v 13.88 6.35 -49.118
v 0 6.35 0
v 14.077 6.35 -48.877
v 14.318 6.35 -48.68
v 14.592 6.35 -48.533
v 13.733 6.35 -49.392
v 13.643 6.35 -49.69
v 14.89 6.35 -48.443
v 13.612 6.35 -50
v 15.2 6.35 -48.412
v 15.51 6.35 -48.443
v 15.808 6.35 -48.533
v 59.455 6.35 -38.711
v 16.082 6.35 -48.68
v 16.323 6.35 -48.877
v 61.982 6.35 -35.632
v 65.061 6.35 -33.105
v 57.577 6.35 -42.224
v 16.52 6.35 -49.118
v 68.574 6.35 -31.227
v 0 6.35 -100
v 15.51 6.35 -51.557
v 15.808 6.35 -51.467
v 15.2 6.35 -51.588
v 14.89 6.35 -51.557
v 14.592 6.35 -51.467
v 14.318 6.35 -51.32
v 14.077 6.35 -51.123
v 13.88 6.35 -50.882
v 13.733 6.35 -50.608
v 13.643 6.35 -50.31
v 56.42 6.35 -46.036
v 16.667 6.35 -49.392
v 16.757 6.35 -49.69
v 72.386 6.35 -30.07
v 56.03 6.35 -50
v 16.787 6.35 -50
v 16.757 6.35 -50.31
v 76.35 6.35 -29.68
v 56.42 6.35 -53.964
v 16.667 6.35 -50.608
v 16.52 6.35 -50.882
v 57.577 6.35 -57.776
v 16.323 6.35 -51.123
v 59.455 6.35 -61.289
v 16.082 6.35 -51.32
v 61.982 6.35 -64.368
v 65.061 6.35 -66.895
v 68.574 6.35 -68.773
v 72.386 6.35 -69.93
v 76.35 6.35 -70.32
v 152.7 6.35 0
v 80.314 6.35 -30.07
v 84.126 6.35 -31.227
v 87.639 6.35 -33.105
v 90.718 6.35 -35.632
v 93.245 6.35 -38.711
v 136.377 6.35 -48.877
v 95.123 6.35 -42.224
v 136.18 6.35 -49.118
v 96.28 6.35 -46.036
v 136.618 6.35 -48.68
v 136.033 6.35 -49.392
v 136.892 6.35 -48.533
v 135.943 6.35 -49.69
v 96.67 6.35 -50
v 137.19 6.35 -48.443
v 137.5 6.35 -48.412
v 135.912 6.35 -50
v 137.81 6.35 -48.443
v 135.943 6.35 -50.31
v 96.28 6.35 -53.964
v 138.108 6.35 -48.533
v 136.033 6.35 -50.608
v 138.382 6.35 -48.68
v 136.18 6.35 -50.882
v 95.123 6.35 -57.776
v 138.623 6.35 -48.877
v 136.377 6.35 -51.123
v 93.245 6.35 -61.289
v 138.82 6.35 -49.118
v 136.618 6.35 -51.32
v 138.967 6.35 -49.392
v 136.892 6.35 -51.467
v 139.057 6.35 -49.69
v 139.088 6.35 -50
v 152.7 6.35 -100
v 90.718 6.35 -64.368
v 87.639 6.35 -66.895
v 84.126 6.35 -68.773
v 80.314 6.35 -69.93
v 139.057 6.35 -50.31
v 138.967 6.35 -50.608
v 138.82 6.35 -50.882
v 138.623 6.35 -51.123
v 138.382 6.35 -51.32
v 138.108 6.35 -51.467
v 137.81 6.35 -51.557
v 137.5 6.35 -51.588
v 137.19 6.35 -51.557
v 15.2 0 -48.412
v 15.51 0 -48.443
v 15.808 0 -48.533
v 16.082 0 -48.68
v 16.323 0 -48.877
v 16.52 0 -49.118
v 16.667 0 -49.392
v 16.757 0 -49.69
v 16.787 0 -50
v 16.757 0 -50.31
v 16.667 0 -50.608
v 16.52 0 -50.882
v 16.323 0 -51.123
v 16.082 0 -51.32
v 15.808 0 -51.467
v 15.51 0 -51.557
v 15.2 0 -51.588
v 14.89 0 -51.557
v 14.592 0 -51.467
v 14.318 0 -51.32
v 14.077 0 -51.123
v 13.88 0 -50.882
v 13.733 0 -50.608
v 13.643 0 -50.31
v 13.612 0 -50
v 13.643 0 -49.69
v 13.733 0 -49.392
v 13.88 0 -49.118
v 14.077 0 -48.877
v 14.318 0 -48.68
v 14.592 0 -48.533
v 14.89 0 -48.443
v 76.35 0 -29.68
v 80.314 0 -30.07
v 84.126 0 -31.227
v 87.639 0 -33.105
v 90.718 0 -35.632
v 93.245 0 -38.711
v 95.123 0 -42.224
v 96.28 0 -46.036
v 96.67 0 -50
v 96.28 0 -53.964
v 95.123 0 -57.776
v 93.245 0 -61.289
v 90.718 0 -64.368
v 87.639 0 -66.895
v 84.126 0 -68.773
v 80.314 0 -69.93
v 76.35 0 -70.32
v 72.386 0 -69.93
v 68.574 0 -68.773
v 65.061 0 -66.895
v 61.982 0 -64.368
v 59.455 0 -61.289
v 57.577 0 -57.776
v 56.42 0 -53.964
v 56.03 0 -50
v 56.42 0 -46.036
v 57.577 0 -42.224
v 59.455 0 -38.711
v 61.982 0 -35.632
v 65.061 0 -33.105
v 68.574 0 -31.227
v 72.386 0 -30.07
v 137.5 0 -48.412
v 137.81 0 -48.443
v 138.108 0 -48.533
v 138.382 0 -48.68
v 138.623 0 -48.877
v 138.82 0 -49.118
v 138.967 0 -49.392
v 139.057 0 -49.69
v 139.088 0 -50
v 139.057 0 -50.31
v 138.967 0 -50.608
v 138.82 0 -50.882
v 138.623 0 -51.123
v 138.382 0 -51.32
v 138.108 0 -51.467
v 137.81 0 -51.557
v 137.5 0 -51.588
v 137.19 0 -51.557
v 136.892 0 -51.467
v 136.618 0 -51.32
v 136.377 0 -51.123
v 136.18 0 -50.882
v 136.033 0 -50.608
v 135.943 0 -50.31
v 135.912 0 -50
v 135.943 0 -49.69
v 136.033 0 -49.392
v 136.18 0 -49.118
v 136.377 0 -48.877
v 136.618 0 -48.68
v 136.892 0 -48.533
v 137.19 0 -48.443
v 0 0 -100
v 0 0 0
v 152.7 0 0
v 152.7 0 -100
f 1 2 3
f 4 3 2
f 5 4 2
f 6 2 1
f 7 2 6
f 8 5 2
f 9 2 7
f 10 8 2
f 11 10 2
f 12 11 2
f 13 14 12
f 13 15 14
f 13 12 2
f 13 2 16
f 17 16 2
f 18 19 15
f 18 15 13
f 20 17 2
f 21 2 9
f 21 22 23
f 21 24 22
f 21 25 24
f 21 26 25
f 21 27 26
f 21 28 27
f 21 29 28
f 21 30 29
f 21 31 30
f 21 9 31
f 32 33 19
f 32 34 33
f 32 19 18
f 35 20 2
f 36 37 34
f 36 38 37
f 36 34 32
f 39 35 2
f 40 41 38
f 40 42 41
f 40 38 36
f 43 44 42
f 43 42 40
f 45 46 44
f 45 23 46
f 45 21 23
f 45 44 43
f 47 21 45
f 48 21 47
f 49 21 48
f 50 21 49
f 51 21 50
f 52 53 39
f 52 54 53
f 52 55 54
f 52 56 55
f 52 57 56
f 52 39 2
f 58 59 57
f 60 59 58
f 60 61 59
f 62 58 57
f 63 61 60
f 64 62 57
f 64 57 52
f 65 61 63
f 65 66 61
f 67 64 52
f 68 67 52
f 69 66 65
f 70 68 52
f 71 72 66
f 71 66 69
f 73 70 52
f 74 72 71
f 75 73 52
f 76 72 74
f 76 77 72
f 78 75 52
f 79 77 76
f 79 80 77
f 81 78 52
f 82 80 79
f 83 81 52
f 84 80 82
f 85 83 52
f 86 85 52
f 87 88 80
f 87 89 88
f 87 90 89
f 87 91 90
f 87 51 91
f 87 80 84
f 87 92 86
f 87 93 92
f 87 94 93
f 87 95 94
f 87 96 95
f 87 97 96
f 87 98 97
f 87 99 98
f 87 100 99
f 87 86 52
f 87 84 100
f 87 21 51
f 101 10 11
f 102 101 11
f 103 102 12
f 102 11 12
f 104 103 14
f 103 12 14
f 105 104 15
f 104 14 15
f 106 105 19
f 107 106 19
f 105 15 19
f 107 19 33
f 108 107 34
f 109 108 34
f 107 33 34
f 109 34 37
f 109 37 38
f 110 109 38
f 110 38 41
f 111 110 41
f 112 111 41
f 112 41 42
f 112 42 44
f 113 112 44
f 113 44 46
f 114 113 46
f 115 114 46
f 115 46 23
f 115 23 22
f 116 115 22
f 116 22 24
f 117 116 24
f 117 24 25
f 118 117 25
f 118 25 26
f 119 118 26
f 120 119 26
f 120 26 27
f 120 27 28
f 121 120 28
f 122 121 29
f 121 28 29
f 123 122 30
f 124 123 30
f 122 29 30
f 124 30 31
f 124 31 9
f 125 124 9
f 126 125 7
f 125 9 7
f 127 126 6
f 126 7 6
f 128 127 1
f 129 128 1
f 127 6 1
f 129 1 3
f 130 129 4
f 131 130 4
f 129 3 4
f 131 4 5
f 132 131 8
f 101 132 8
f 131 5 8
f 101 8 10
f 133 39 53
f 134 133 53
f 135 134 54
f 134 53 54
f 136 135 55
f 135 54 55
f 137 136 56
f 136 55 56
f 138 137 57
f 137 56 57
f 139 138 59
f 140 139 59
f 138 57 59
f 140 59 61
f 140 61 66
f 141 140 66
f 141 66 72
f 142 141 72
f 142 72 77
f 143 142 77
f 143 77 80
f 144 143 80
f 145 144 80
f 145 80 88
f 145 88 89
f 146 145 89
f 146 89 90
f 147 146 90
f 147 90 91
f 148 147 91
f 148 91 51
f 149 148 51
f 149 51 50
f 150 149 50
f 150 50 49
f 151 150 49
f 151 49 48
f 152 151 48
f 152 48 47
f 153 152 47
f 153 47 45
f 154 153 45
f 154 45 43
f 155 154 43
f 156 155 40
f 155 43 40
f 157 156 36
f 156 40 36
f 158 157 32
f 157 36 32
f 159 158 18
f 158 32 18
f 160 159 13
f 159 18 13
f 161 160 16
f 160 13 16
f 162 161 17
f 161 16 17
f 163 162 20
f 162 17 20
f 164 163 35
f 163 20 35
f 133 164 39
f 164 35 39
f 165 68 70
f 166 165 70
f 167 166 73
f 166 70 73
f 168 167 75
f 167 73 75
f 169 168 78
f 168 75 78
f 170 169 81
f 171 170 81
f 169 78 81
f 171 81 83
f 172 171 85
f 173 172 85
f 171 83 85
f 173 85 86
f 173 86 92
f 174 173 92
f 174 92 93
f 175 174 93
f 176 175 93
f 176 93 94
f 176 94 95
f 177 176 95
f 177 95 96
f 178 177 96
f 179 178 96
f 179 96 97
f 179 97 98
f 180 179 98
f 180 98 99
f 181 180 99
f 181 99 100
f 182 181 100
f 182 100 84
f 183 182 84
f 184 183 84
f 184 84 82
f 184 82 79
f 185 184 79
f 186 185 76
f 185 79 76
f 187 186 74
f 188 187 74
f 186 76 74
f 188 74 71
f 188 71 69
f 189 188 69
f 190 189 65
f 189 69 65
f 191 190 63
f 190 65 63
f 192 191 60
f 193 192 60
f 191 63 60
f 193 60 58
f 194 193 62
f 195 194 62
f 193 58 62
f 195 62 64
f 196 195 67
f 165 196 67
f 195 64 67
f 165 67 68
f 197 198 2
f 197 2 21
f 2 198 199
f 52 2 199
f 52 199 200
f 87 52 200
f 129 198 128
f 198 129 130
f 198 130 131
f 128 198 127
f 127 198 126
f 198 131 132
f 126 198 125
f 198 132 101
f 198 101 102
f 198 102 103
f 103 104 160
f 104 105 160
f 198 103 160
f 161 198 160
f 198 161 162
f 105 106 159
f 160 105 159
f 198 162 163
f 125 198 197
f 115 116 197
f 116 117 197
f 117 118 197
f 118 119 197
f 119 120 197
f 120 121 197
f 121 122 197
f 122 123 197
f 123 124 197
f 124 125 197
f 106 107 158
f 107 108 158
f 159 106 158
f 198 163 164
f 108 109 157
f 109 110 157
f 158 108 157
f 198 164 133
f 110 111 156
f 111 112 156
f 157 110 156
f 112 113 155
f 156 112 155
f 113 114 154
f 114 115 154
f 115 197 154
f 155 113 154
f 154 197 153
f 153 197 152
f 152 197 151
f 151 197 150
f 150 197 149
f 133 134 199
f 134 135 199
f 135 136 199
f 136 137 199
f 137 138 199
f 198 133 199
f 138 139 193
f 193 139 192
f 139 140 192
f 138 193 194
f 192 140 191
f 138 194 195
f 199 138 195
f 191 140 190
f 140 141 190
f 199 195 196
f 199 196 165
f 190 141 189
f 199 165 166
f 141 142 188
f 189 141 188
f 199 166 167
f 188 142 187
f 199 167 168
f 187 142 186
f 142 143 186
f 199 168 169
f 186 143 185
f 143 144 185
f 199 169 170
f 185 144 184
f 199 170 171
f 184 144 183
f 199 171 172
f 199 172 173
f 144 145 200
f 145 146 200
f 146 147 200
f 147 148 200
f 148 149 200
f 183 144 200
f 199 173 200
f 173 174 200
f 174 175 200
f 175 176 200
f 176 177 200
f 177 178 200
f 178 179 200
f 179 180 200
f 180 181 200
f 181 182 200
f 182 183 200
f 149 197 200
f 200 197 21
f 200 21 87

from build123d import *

# Parameters (mm, degrees)
SKETCH1_W           = 152.7
SKETCH1_H           = 100
BOSS_EXTRUDE1_DEPTH = 6.35
SKETCH2_R           = 20.32
CUT_EXTRUDE1_DEPTH  = 10
SKETCH3_R           = 1.5875
CUT_EXTRUDE2_DEPTH  = 10


with BuildPart() as part:
    # Sketch1 → Boss-Extrude1 (new body)
    with BuildSketch(Plane(origin=(0, 0, 0), x_dir=(1, 0, 0), z_dir=(0, 1, 0))):
        with Locations((76.35, 50)):
            Rectangle(SKETCH1_W, SKETCH1_H)
    extrude(amount=BOSS_EXTRUDE1_DEPTH)

    # Sketch2 → Cut-Extrude1 (cut)
    with BuildSketch(Plane(origin=(0, 6.35, 0), x_dir=(1, 0, 0), z_dir=(0, 1, 0))):
        with Locations(Location((76.35, 50, 0), (0, 0, 270))):
            Circle(SKETCH2_R)
    extrude(amount=-CUT_EXTRUDE1_DEPTH, mode=Mode.SUBTRACT)

    # Sketch3 → Cut-Extrude2 (cut)
    with BuildSketch(Plane(origin=(0, 6.35, 0), x_dir=(1, 0, 0), z_dir=(0, 1, 0))):
        with Locations(Location((15.2, 50, 0), (0, 0, 270))):
            Circle(SKETCH3_R)
        with Locations(Location((137.5, 50, 0), (0, 0, 270))):
            Circle(SKETCH3_R)
    extrude(amount=-CUT_EXTRUDE2_DEPTH, mode=Mode.SUBTRACT)


solid = part.part
